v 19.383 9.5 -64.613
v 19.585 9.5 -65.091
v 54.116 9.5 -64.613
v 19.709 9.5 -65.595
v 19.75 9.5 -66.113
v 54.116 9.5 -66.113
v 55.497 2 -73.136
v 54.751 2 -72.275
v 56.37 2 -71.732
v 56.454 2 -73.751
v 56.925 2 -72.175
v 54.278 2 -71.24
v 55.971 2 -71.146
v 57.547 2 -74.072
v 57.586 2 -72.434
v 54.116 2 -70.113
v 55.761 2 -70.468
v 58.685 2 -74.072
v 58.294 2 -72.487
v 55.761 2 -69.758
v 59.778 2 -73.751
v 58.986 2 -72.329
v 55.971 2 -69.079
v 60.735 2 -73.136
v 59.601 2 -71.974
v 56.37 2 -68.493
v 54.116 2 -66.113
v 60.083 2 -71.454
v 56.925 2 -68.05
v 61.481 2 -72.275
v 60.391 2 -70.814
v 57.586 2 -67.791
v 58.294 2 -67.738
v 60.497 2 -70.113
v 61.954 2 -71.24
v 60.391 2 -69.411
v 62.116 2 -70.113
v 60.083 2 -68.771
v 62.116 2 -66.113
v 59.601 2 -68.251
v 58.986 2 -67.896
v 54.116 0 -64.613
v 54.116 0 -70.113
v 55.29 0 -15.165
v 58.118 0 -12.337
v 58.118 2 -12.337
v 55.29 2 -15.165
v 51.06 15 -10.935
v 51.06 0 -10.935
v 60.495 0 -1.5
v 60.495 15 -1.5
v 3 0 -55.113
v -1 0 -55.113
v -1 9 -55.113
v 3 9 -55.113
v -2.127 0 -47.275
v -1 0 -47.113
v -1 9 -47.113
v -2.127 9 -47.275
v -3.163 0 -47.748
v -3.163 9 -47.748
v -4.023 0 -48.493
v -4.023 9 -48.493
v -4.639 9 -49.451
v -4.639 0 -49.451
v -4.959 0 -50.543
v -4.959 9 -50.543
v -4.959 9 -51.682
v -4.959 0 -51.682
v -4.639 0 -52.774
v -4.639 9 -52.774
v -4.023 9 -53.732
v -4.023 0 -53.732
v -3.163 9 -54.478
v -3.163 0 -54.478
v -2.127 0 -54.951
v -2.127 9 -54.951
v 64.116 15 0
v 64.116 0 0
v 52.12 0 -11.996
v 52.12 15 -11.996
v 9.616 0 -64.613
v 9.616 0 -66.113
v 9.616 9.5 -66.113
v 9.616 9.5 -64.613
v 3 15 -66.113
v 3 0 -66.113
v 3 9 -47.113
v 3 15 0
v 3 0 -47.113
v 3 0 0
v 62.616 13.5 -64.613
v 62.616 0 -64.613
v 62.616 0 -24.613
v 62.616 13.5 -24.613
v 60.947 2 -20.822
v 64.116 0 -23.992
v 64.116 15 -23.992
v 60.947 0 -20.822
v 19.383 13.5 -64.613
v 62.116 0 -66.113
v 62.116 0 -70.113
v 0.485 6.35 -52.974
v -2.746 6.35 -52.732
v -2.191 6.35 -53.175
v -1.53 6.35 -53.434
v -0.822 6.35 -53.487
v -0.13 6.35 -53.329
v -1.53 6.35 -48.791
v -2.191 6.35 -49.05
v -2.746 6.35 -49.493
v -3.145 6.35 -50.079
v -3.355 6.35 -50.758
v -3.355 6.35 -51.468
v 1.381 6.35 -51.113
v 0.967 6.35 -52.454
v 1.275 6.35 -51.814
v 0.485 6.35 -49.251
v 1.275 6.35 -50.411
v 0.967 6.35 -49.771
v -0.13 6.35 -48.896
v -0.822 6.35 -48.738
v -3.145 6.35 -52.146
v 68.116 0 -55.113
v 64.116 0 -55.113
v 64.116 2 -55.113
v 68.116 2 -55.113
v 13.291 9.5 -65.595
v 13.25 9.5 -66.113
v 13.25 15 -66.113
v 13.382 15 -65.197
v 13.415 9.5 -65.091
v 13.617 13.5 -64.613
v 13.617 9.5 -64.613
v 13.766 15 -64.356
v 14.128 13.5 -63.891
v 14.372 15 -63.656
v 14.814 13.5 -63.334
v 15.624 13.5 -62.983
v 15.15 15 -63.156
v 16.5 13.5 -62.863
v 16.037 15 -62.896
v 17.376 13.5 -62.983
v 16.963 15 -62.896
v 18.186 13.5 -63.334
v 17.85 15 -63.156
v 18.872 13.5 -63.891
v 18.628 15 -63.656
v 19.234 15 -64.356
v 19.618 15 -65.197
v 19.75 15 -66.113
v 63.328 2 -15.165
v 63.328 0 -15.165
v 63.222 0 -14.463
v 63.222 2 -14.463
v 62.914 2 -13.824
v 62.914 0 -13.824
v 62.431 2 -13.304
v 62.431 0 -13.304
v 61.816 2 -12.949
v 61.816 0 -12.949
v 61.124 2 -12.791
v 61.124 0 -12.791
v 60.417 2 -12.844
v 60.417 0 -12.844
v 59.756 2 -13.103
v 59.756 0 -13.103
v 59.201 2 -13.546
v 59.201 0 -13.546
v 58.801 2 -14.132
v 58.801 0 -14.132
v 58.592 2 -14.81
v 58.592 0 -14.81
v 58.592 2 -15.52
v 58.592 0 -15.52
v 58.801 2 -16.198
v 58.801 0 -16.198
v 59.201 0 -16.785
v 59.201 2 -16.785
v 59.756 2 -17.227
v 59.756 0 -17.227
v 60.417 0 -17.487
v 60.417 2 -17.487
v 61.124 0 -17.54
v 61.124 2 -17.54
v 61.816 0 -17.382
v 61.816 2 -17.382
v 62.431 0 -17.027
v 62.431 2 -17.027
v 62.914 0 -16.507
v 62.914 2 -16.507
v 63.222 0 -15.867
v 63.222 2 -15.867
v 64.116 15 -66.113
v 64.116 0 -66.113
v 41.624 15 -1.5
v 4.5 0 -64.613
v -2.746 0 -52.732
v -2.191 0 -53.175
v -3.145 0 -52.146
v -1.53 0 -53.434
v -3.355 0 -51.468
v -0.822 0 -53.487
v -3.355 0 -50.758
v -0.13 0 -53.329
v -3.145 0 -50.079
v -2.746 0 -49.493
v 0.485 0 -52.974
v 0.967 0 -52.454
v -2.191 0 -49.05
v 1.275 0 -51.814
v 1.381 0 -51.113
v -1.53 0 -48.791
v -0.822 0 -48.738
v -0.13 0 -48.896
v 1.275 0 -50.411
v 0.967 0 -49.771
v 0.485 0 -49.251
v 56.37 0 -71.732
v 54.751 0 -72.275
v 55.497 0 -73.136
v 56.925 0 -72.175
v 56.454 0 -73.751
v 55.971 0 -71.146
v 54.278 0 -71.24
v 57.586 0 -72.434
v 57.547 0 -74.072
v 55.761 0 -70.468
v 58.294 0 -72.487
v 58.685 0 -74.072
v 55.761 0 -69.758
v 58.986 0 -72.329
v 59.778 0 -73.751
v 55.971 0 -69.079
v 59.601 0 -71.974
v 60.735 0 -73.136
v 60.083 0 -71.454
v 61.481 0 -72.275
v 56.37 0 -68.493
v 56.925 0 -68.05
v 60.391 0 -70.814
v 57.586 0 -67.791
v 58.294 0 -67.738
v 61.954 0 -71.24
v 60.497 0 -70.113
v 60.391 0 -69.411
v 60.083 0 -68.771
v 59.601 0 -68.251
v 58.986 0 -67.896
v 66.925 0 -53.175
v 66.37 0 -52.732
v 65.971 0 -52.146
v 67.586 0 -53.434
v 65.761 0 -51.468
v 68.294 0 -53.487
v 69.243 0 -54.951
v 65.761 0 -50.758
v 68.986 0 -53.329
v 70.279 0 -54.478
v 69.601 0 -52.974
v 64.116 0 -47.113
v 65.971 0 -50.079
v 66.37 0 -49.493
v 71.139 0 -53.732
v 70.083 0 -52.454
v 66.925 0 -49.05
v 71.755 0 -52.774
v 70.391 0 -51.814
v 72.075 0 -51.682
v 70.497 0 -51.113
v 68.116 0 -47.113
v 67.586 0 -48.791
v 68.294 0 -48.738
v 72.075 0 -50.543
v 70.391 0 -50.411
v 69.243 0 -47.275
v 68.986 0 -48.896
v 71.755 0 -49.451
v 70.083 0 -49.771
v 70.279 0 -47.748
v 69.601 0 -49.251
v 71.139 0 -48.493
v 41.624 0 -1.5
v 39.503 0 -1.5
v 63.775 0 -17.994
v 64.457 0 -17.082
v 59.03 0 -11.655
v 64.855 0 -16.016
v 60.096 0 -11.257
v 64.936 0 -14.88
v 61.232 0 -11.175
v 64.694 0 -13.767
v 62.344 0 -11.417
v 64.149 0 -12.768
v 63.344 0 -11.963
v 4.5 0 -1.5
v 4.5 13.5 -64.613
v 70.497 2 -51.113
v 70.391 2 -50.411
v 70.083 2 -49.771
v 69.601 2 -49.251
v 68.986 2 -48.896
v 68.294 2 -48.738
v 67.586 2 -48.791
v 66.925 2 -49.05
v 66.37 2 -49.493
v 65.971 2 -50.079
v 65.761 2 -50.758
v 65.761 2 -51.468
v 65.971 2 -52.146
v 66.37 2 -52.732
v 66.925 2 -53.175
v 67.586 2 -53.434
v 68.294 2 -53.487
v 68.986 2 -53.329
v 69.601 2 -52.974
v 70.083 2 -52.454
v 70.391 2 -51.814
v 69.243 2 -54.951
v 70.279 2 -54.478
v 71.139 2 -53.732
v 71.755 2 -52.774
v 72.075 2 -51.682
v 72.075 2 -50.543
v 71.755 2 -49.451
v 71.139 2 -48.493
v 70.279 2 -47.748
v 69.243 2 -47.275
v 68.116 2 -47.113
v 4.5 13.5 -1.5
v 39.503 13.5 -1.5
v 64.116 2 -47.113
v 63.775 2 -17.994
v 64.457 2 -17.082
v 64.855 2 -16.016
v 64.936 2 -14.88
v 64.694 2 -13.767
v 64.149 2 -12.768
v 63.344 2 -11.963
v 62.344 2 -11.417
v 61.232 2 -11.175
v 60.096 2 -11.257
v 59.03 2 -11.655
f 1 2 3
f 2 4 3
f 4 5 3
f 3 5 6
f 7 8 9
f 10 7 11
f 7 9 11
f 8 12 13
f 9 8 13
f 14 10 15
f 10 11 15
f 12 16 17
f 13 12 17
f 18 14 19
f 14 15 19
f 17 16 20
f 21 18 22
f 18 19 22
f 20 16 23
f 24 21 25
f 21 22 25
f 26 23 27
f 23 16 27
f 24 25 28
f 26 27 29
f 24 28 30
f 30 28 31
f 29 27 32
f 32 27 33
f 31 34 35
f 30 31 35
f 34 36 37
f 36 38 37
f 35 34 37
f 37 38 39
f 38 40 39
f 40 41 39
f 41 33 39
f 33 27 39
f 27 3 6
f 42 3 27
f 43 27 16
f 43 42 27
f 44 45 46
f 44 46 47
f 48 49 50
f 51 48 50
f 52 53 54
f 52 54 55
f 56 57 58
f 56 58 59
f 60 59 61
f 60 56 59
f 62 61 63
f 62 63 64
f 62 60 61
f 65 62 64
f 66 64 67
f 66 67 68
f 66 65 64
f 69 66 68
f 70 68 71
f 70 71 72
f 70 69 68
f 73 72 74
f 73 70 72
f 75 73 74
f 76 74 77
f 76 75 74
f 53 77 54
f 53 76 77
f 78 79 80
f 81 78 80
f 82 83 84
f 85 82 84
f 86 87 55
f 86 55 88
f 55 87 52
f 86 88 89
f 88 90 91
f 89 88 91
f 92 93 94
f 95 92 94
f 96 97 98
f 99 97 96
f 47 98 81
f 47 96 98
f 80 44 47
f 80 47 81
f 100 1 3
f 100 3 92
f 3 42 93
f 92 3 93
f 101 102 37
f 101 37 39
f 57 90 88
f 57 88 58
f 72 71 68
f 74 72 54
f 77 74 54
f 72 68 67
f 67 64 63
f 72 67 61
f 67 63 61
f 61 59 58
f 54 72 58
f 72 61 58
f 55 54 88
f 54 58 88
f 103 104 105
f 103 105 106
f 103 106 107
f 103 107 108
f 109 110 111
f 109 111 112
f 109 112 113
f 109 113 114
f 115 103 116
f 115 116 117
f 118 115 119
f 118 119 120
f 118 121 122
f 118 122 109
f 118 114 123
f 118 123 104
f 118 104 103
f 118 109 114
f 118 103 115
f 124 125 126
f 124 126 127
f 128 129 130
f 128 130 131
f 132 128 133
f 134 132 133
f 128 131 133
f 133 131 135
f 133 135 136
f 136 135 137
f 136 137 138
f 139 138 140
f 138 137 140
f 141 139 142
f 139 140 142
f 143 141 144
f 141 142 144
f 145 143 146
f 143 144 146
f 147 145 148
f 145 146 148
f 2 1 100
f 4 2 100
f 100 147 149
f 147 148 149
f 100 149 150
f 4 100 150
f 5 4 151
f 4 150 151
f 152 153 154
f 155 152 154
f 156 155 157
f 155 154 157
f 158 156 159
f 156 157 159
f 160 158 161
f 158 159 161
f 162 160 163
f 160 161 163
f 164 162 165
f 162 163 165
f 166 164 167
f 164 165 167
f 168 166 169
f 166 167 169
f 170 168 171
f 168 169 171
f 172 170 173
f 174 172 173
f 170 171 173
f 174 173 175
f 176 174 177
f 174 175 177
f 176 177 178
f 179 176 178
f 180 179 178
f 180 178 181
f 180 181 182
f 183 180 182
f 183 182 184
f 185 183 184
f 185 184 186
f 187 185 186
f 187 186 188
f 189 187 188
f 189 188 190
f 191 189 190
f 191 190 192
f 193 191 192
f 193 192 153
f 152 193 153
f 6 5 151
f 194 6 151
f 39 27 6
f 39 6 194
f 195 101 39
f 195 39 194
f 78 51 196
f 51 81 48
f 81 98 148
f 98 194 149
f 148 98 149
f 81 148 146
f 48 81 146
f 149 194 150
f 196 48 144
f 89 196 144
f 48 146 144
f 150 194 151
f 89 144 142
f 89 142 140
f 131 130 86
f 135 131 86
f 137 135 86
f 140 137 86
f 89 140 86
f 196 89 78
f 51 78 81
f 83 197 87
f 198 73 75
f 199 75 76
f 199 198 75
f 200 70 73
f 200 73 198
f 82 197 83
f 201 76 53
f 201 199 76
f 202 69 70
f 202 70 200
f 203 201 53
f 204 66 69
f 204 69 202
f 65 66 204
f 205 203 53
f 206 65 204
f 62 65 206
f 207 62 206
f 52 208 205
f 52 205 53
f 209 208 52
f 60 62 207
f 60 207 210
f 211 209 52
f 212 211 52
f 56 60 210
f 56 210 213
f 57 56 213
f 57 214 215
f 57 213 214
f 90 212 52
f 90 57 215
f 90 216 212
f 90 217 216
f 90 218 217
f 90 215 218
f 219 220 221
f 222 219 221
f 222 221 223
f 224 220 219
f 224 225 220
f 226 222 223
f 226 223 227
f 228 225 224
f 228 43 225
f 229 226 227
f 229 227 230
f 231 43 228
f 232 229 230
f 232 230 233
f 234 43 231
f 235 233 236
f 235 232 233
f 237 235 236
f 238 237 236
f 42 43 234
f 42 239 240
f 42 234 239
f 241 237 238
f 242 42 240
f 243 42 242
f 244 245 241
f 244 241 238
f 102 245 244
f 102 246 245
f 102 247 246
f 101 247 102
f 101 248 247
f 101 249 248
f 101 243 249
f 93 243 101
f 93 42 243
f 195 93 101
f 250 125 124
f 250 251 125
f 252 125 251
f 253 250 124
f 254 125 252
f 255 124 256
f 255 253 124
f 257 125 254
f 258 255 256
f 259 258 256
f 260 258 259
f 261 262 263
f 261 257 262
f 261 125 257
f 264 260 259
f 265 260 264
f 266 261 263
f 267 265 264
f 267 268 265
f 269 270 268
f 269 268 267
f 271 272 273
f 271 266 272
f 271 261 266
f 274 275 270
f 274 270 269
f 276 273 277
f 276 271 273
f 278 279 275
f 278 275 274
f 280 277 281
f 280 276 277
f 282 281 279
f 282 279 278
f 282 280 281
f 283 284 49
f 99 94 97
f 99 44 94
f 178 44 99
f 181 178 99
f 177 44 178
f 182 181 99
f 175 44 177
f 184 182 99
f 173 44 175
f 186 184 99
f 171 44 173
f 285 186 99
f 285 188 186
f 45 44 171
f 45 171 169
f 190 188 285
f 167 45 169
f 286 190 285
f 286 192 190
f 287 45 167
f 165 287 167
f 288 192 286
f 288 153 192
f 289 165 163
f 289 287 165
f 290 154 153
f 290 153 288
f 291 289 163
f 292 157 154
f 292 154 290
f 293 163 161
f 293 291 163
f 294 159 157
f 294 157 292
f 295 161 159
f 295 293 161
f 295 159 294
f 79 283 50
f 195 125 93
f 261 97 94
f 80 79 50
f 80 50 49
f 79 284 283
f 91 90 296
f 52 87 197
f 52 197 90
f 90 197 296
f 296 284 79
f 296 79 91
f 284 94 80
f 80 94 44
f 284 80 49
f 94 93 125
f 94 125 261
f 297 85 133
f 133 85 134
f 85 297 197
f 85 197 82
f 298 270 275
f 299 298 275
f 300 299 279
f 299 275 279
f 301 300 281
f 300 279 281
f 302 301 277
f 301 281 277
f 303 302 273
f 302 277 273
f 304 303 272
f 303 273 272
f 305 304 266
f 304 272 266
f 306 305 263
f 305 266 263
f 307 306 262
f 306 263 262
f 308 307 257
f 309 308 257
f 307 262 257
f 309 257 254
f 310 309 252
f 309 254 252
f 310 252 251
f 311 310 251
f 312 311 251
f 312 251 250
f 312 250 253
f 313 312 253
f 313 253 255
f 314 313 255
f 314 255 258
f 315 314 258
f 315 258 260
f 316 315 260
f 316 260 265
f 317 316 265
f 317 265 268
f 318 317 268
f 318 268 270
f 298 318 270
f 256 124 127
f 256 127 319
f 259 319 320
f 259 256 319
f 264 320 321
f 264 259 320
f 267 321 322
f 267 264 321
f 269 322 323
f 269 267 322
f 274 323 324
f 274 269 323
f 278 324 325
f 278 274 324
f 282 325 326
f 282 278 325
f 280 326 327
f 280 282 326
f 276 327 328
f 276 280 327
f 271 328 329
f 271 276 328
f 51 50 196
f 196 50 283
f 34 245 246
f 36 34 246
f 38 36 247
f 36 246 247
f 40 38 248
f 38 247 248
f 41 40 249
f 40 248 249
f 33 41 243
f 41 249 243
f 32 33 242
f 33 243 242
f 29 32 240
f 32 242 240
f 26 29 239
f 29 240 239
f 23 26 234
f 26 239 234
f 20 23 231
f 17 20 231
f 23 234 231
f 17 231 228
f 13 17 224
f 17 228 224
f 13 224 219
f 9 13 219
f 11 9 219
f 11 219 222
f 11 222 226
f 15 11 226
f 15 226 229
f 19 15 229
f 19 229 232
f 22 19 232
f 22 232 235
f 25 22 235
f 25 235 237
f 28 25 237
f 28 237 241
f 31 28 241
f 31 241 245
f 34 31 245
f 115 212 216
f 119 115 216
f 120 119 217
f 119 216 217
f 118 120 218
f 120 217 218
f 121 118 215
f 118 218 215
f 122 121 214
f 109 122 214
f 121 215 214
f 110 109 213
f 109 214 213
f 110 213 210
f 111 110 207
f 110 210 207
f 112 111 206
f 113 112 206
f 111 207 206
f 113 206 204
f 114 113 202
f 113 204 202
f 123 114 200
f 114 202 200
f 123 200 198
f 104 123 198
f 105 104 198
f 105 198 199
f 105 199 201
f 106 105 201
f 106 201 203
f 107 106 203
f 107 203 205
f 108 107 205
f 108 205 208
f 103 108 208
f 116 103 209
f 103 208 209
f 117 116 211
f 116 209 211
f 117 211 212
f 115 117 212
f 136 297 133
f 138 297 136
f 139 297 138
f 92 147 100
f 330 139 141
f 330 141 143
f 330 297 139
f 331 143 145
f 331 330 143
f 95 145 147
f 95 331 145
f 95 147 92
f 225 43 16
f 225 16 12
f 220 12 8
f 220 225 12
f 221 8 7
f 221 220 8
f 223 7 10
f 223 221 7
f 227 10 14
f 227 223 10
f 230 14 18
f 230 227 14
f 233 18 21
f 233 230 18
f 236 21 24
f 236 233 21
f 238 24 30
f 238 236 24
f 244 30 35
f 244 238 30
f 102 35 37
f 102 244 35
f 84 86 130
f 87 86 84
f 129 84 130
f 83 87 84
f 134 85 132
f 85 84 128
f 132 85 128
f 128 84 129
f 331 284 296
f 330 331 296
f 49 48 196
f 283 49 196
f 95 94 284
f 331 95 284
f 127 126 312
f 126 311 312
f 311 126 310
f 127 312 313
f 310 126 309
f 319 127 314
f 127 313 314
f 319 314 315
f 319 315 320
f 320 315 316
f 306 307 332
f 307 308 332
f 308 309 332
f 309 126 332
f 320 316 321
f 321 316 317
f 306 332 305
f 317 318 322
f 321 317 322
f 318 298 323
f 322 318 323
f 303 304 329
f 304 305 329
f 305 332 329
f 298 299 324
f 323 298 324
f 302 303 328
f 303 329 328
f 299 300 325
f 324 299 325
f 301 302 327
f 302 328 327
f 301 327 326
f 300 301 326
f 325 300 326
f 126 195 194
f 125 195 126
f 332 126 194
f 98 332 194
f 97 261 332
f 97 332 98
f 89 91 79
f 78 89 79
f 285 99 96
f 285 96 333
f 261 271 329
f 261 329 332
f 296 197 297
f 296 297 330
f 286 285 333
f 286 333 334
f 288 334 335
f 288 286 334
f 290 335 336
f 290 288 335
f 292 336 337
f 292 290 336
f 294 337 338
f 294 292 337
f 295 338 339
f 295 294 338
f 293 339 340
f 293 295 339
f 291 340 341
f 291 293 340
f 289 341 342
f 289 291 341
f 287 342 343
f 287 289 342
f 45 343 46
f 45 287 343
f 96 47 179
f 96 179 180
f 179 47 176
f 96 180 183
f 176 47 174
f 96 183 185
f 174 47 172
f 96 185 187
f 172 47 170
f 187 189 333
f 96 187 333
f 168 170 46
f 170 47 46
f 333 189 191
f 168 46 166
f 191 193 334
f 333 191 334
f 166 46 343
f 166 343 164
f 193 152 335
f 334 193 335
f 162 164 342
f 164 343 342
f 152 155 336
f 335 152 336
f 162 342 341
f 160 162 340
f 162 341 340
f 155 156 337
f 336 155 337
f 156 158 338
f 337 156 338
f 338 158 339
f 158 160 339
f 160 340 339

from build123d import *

# Parameters (mm, degrees)
BOSS_EXTRUDE2_DEPTH  = 15
CUT_EXTRUDE1_DEPTH   = 13.5
SKETCH4_W            = 22
SKETCH4_H            = 1.5
CUT_EXTRUDE2_DEPTH   = 7.5
CUT_EXTRUDE3_DEPTH   = 1.5
CUT_EXTRUDE4_DEPTH   = 10
SKETCH21_W           = 1.5
SKETCH21_H           = 63.1126
BOSS_EXTRUDE6_DEPTH  = 13.5
CUT_EXTRUDE7_DEPTH   = 16
BOSS_EXTRUDE7_DEPTH  = 2
BOSS_EXTRUDE8_DEPTH  = 2
BOSS_EXTRUDE9_DEPTH  = 2
BOSS_EXTRUDE10_DEPTH = 9
SKETCH29_R           = 2.38125
CUT_EXTRUDE8_DEPTH   = 16
SKETCH31_R           = 2.38125
CUT_EXTRUDE9_DEPTH   = 6.35


with BuildPart() as part:
    # Sketch2 → Boss-Extrude2 (new body)
    with BuildSketch(Plane(origin=(0, 0, 0), x_dir=(1, 0, 0), z_dir=(0, 1, 0))):
        Polygon((40.1244, 0), (0, 0), (0, 66.1126), (64.116, 66.1126), (64.116, 23.9916), align=None)
        Polygon((41.6244, 1.5), (40.1244, 0), (64.116, 0), (52.1202, 11.9958), (51.059539828, 10.935139828), (60.494679656, 1.5), align=None)
    extrude(amount=BOSS_EXTRUDE2_DEPTH)

    # Sketch3 → Cut-Extrude1 (cut)
    with BuildSketch(Plane.XZ):
        Polygon((1.5, -64.6126), (62.616, -64.6126), (62.616, -24.612920344), (39.503079656, -1.5), (1.5, -1.5), align=None)
    extrude(amount=-CUT_EXTRUDE1_DEPTH, mode=Mode.SUBTRACT)

    # Sketch4 → Cut-Extrude2 (cut)
    with BuildSketch(Plane.XZ):
        with Locations((30.616, -65.3626)):
            Rectangle(SKETCH4_W, SKETCH4_H)
    extrude(amount=-CUT_EXTRUDE2_DEPTH, mode=Mode.SUBTRACT)

    # Sketch16 → Cut-Extrude3 (cut)
    with BuildSketch(Plane(origin=(0, 0, -66.1126), x_dir=(-1, 0, 0), z_dir=(0, 0, -1))):
        Polygon((-19.616, 0), (-9.616, 0), (-9.616, 9.5), (-54.116, 9.5), (-54.116, 0), (-41.616, 0), (-41.616, 7.5), (-19.616, 7.5), align=None)
    extrude(amount=-CUT_EXTRUDE3_DEPTH, mode=Mode.SUBTRACT)

    # Sketch18 → Cut-Extrude4 (cut)
    with BuildSketch(Plane(origin=(0, 15, 0), x_dir=(1, 0, 0), z_dir=(0, 1, 0))):
        with BuildLine():
            ThreePointArc((19.75, 66.1126), (16.5, 69.3626), (13.25, 66.1126))
            Line((13.25, 66.1126), (16.5, 66.1126))
            Line((16.5, 66.1126), (19.75, 66.1126))
        make_face()
        with BuildLine():
            Line((16.5, 66.1126), (13.25, 66.1126))
            ThreePointArc((13.25, 66.1126), (16.5, 62.8626), (19.75, 66.1126))
            Line((19.75, 66.1126), (16.5, 66.1126))
        make_face()
    extrude(amount=-CUT_EXTRUDE4_DEPTH, mode=Mode.SUBTRACT)

    # Sketch21 → Boss-Extrude6 (add)
    with BuildSketch(Plane.XZ):
        with Locations((3.75, -33.0563)):
            Rectangle(SKETCH21_W, SKETCH21_H)
    extrude(amount=-BOSS_EXTRUDE6_DEPTH)

    # Sketch24 → Cut-Extrude7 (cut, through all)
    with BuildSketch(Plane.XZ):
        Polygon((3, -1.5), (3, 0), (0, 0), (0, -66.1126), (3, -66.1126), align=None)
    extrude(amount=-CUT_EXTRUDE7_DEPTH, mode=Mode.SUBTRACT)

    # Sketch25 → Boss-Extrude7 (add)
    with BuildSketch(Plane.XZ):
        with BuildLine():
            Line((62.116, -70.1126), (62.116, -66.1126))
            Line((62.116, -66.1126), (58.116, -66.1126))
            Line((58.116, -66.1126), (54.116, -66.1126))
            Line((54.116, -66.1126), (54.116, -70.1126))
            ThreePointArc((54.116, -70.1126), (58.116, -74.1126), (62.116, -70.1126))
        make_face()
    extrude(amount=-BOSS_EXTRUDE7_DEPTH)

    # Sketch26 → Boss-Extrude8 (add)
    with BuildSketch(Plane.XZ):
        with BuildLine():
            Line((64.116, -51.1126), (64.116, -55.1126))
            Line((64.116, -55.1126), (68.116, -55.1126))
            ThreePointArc((68.116, -55.1126), (72.116, -51.1126), (68.116, -47.1126))
            Line((68.116, -47.1126), (64.116, -47.1126))
            Line((64.116, -47.1126), (64.116, -51.1126))
        make_face()
    extrude(amount=-BOSS_EXTRUDE8_DEPTH)

    # Sketch27 → Boss-Extrude9 (add)
    with BuildSketch(Plane.XZ):
        with BuildLine():
            ThreePointArc((63.774954249, -17.9937), (63.774954249, -12.336845751), (58.1181, -12.336845751))
            Line((58.1181, -12.336845751), (55.289672875, -15.165272875))
            Line((55.289672875, -15.165272875), (58.1181, -17.9937))
            Line((58.1181, -17.9937), (60.946527125, -20.822127125))
            Line((60.946527125, -20.822127125), (63.774954249, -17.9937))
        make_face()
    extrude(amount=-BOSS_EXTRUDE9_DEPTH)

    # Sketch28 → Boss-Extrude10 (add)
    with BuildSketch(Plane.XZ):
        with BuildLine():
            Line((-1, -55.1126), (3, -55.1126))
            Line((3, -55.1126), (3, -51.1126))
            Line((3, -51.1126), (3, -47.1126))
            Line((3, -47.1126), (-1, -47.1126))
            ThreePointArc((-1, -47.1126), (-5, -51.1126), (-1, -55.1126))
        make_face()
    extrude(amount=-BOSS_EXTRUDE10_DEPTH)

    # Sketch29 → Cut-Extrude8 (cut, through all)
    with BuildSketch(Plane.XZ):
        with Locations((60.946527125, -15.165272875)):
            Circle(SKETCH29_R)
        with Locations((68.116, -51.1126)):
            Circle(SKETCH29_R)
        with Locations((58.116, -70.1126)):
            Circle(SKETCH29_R)
    extrude(amount=-CUT_EXTRUDE8_DEPTH, mode=Mode.SUBTRACT)

    # Sketch31 → Cut-Extrude9 (cut)
    with BuildSketch(Plane.XZ):
        with Locations((-1, -51.1126)):
            Circle(SKETCH31_R)
    extrude(amount=-CUT_EXTRUDE9_DEPTH, mode=Mode.SUBTRACT)


solid = part.part
